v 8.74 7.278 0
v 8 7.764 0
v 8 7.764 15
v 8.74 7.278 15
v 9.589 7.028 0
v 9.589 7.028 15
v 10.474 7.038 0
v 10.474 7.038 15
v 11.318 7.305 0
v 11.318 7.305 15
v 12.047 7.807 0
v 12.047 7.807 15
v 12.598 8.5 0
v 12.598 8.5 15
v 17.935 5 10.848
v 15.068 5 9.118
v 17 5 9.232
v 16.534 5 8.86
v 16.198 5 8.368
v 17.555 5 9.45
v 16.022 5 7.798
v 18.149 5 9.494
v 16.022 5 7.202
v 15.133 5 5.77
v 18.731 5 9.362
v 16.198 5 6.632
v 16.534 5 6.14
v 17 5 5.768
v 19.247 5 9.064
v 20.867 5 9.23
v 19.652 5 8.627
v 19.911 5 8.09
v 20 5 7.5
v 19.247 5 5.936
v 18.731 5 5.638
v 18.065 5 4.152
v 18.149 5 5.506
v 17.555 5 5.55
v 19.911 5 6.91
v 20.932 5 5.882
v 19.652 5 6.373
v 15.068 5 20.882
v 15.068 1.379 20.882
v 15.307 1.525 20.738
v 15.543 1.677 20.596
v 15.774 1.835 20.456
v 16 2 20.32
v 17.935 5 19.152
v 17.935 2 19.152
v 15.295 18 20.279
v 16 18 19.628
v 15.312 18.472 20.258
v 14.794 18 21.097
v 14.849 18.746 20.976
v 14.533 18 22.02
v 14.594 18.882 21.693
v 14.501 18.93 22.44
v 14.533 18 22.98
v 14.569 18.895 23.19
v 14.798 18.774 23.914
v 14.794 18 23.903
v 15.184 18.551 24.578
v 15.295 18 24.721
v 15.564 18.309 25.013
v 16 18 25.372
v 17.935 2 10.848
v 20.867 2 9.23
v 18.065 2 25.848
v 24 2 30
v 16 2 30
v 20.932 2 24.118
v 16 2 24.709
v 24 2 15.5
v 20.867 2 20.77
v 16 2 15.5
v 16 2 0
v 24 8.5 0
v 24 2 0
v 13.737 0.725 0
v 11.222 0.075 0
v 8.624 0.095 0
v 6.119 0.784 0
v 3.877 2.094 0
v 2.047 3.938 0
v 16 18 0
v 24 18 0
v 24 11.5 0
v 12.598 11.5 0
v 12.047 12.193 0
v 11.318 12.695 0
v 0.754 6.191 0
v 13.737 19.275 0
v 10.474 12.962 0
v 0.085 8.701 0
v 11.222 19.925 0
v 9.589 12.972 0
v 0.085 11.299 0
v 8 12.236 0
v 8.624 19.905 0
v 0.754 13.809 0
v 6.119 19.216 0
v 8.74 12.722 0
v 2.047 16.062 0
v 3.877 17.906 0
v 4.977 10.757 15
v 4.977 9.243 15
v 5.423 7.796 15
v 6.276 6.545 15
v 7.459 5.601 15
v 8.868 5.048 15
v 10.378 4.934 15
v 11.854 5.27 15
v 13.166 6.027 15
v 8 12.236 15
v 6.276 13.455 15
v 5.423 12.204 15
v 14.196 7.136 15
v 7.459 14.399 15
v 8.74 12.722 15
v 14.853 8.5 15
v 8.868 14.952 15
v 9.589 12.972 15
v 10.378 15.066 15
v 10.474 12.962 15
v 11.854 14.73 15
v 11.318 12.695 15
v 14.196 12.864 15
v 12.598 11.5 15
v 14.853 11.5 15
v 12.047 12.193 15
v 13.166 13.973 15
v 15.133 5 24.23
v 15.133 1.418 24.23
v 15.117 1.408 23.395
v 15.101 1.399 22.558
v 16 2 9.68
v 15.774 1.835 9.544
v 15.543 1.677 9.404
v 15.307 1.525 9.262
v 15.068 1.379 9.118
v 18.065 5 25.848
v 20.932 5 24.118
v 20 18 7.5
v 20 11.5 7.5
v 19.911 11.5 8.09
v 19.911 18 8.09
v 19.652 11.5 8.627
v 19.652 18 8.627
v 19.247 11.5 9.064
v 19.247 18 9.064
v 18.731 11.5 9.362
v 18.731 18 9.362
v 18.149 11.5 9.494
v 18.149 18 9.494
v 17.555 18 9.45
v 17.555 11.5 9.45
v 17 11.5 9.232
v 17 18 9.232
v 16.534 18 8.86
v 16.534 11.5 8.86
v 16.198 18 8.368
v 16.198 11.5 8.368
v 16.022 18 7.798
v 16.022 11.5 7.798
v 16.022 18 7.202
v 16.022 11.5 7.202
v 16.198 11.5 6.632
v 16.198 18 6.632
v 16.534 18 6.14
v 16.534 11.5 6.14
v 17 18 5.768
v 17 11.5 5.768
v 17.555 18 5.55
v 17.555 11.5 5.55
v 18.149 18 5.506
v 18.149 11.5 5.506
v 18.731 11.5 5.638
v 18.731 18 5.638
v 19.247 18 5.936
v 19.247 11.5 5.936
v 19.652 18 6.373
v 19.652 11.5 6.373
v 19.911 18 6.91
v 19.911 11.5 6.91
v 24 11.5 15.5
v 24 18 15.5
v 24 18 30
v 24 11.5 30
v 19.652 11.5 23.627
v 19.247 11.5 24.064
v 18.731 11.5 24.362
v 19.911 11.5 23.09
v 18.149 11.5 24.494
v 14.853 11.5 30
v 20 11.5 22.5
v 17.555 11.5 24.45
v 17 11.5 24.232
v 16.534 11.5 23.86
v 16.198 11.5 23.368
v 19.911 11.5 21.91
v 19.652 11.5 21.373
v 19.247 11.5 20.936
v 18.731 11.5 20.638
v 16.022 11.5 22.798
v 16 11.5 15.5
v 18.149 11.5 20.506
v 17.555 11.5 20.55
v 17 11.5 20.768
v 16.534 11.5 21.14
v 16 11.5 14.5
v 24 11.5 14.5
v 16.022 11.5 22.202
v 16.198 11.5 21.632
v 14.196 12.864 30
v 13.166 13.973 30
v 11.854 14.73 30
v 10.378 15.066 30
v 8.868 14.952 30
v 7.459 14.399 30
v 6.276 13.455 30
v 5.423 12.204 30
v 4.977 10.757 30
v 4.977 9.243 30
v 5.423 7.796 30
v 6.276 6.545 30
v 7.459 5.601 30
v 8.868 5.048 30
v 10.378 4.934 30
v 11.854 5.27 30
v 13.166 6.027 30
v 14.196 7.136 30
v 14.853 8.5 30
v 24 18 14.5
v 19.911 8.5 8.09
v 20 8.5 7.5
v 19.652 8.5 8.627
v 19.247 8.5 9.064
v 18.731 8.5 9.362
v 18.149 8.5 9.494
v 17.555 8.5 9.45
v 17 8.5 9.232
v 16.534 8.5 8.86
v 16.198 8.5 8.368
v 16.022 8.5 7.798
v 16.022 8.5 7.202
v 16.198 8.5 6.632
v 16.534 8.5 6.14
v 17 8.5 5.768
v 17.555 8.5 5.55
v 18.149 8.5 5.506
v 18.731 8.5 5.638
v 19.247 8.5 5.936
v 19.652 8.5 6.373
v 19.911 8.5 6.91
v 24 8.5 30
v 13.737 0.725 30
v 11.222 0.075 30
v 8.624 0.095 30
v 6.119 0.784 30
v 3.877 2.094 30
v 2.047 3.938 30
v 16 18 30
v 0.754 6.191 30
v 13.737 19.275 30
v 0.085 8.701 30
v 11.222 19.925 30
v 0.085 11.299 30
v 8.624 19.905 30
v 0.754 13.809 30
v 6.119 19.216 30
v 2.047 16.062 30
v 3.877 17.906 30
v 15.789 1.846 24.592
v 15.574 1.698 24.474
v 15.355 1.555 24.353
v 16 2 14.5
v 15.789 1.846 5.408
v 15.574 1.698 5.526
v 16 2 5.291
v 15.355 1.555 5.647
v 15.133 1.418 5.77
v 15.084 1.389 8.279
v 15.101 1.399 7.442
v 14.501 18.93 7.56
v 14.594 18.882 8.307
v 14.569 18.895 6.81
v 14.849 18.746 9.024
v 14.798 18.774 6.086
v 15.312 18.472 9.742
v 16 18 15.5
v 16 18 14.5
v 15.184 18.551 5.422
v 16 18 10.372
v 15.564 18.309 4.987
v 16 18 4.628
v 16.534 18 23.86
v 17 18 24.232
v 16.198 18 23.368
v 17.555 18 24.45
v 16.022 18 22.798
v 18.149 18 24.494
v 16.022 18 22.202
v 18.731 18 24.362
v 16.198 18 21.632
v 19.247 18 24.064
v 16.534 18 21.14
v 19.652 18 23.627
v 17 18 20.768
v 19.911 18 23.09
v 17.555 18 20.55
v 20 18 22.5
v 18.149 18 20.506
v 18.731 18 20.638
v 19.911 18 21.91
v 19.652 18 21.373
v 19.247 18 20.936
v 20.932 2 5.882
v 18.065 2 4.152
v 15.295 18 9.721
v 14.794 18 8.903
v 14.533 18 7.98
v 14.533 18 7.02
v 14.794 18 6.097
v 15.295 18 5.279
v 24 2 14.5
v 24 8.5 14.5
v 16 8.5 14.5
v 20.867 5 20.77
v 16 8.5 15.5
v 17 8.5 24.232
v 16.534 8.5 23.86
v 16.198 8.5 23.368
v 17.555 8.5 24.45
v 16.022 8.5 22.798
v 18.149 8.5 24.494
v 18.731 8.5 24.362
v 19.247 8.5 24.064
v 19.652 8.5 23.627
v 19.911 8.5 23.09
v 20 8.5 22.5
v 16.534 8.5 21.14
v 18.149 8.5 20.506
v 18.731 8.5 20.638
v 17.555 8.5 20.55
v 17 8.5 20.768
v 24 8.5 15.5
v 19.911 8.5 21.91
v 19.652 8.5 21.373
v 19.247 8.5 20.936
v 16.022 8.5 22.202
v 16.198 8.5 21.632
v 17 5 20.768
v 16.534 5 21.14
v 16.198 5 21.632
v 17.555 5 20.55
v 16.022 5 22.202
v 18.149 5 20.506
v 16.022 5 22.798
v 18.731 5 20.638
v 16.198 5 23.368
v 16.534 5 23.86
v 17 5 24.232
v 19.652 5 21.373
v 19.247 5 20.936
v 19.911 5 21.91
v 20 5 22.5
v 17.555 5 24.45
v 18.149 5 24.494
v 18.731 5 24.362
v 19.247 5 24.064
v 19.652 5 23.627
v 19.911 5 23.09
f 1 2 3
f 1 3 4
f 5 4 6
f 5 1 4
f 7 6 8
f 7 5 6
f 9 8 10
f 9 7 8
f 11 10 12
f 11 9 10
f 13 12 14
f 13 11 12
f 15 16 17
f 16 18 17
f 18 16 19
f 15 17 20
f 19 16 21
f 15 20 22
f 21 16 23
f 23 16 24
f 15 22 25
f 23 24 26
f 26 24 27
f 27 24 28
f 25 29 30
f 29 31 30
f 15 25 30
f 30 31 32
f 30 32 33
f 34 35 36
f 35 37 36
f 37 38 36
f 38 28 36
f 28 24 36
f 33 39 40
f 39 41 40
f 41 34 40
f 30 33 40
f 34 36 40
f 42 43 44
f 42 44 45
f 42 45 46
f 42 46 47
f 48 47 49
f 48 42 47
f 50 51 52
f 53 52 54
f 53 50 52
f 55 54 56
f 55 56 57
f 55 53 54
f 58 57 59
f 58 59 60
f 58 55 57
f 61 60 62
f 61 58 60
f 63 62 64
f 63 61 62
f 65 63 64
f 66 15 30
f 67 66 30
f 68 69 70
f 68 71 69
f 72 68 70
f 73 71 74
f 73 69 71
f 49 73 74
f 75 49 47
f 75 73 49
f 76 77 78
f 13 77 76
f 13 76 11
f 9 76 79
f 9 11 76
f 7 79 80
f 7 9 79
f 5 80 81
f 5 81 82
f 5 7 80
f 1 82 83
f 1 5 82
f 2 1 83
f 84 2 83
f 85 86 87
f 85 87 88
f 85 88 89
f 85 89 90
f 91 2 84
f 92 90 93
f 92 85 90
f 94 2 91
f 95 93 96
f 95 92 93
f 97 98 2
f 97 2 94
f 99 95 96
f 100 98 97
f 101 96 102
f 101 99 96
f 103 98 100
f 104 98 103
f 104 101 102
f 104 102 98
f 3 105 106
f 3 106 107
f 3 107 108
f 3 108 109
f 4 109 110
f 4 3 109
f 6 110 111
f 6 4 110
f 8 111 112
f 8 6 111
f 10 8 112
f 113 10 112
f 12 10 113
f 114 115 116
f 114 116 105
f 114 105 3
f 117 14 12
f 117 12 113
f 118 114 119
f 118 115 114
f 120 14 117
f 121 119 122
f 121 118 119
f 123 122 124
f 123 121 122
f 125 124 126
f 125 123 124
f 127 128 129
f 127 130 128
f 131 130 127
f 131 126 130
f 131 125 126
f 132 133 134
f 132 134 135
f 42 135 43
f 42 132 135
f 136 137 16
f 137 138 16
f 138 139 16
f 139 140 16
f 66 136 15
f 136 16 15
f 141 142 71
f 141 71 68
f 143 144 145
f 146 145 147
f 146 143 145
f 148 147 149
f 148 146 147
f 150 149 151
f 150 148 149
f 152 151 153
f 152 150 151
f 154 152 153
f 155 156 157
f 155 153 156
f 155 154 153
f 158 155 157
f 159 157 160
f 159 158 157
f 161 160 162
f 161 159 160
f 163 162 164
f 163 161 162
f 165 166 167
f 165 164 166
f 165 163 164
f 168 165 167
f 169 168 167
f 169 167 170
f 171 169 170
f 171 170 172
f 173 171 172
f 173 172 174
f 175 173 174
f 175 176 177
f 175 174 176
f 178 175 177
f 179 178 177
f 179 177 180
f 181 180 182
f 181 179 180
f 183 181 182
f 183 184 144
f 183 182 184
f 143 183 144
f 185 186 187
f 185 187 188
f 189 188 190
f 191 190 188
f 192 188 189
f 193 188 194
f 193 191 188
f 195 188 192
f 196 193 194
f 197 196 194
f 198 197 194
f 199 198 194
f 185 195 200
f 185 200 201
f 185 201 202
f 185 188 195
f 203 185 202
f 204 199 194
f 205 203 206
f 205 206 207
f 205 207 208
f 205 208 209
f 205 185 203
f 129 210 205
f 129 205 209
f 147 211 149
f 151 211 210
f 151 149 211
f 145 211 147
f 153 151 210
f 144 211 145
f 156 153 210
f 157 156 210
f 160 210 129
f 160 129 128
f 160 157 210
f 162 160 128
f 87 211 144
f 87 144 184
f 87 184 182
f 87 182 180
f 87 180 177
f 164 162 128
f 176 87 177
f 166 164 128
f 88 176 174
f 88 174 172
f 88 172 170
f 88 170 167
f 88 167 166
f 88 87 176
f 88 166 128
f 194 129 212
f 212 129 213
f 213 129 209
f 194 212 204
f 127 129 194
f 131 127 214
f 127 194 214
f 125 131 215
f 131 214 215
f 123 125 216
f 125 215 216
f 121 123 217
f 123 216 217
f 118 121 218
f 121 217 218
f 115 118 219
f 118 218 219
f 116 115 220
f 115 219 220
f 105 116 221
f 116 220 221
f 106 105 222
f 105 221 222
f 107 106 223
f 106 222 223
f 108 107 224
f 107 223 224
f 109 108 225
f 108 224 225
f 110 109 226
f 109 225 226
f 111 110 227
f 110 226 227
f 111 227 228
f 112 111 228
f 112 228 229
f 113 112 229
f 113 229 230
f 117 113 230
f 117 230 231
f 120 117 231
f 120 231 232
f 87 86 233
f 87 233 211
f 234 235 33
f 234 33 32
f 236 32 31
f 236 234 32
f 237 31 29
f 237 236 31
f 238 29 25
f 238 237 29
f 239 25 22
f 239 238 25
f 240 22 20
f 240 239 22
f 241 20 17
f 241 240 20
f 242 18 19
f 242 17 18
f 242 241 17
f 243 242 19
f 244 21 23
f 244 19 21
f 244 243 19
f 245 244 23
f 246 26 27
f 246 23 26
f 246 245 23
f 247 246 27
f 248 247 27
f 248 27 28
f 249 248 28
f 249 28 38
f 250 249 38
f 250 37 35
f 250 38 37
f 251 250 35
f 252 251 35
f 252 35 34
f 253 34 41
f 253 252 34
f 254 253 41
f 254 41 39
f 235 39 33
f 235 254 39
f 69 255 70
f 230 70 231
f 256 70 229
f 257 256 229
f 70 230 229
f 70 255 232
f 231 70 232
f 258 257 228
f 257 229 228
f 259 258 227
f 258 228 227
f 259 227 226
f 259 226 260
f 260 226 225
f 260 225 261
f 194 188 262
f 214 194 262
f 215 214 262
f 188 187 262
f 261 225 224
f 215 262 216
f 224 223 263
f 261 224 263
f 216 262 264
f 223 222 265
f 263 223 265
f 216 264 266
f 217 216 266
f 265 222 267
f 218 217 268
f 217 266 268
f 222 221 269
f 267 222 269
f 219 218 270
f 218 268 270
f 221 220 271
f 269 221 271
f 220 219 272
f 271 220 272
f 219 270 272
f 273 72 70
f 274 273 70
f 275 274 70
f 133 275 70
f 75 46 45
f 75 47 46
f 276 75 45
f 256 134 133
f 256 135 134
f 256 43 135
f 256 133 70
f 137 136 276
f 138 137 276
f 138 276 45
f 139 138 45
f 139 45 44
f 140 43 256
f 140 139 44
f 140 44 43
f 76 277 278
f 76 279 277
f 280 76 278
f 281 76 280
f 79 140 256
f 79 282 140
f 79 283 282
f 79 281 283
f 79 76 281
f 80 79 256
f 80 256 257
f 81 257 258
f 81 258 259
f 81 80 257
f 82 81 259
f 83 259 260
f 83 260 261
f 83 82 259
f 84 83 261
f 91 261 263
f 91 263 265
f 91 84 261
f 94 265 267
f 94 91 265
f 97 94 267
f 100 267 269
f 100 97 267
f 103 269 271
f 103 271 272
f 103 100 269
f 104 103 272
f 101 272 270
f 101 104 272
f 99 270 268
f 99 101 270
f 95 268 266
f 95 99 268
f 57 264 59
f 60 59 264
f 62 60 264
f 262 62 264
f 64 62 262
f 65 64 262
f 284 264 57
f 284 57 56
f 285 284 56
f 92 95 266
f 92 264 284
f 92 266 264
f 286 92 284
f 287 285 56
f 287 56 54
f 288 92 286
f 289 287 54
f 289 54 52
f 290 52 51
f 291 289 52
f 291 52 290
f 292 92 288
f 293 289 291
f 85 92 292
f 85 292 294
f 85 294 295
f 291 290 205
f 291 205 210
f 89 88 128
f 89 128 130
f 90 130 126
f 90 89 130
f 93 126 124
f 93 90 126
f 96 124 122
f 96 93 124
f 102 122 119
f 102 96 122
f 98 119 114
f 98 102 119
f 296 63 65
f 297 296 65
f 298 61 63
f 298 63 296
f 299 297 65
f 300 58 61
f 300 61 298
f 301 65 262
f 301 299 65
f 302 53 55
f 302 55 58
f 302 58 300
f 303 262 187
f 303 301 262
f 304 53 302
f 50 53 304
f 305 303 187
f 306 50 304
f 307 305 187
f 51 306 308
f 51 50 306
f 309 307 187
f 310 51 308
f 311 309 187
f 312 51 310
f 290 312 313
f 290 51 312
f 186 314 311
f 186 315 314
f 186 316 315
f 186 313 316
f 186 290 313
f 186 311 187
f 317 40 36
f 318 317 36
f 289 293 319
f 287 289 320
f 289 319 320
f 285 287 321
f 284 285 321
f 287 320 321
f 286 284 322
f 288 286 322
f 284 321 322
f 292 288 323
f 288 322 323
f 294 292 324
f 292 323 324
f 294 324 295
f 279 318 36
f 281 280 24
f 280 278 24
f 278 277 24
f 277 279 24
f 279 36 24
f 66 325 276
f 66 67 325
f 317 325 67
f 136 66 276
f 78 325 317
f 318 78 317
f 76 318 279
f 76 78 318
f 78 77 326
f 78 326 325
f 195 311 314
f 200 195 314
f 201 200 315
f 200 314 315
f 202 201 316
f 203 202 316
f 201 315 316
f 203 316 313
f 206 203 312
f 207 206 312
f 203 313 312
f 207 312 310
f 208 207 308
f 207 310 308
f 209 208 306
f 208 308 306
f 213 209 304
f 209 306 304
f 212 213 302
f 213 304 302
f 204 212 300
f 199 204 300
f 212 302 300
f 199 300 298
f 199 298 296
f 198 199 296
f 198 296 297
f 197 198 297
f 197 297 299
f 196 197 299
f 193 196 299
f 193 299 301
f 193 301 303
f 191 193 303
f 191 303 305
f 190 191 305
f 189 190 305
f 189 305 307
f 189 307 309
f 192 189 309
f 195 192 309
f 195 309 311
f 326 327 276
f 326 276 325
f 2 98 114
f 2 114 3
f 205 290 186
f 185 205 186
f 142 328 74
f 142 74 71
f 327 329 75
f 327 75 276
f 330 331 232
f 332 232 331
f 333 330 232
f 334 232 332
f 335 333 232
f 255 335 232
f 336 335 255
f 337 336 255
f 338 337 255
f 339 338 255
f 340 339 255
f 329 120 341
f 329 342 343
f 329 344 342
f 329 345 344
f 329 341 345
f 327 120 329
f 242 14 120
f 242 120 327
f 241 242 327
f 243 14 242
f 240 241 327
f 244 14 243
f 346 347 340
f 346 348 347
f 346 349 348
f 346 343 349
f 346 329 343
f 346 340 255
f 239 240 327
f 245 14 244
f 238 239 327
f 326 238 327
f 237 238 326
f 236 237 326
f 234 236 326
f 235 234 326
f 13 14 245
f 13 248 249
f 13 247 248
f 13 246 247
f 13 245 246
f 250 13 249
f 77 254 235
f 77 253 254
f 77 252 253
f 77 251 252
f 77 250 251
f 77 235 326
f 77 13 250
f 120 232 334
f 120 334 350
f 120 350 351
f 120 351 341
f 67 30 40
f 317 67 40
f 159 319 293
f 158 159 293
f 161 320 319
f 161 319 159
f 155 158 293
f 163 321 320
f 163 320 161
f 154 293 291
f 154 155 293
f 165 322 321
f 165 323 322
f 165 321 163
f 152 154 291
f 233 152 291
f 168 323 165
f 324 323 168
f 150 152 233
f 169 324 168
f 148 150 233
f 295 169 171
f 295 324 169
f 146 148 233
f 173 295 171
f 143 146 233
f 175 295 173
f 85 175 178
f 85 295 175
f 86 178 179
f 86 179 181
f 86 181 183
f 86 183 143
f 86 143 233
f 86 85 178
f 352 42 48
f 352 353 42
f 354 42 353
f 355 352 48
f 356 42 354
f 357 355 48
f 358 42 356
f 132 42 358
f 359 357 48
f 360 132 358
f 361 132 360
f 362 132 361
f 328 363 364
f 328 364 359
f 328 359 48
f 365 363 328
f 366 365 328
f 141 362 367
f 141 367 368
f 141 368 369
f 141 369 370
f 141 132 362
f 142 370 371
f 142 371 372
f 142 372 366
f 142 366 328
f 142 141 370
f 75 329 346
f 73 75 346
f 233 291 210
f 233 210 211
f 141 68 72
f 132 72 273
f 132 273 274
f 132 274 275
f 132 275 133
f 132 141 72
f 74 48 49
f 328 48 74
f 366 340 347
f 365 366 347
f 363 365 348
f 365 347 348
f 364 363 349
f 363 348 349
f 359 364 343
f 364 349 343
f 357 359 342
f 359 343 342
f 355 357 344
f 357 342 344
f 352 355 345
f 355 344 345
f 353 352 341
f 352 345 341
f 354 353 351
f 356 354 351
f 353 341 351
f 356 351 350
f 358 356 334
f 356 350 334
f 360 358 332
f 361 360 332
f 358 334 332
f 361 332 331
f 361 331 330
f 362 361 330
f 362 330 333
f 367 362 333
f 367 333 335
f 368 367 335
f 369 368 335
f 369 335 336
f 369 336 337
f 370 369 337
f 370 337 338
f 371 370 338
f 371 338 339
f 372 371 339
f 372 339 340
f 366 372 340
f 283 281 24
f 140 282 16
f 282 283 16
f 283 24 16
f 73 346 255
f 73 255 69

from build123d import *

# Parameters (mm, degrees)
BOSS_EXTRUDE1_DEPTH     = 30
SKETCH3_R               = 2
CUT_EXTRUDE2_DEPTH      = 19.00000001
SKETCH8_R               = 3.5
CUT_EXTRUDE5_DEPTH      = 10
SKETCH9_W               = 8.000001136
SKETCH9_H               = 1
CUT_EXTRUDE6_DEPTH      = 2.999999513
CUT_EXTRUDE6_DEPTH_BACK = 19.00000011
CUT_EXTRUDE7_START      = -3
CUT_EXTRUDE7_DEPTH      = 5.999999514
SKETCH12_R              = 5.08
CUT_EXTRUDE8_DEPTH      = 15


with BuildPart() as part:
    # Sketch1 → Boss-Extrude1 (new body)
    with BuildSketch(Plane.XY):
        with BuildLine():
            Line((7.999999523, 12.236067772), (7.999999523, 7.763931751))
            ThreePointArc((7.999999523, 7.763931751), (10.474207269, 7.037715521), (12.598076062, 8.499999806))
            Line((12.598076062, 8.499999806), (23.999999754, 8.499999806))
            Line((23.999999754, 8.499999806), (23.999999754, 1.999999464))
            Line((23.999999754, 1.999999464), (15.9999988, 1.999999464))
            ThreePointArc((15.9999988, 1.999999464), (-3.4e-08, 9.99999976), (15.999998799, 18.00000006))
            Line((15.999998799, 18.00000006), (23.999999935, 18.00000006))
            Line((23.999999935, 18.00000006), (23.999999935, 11.500000167))
            Line((23.999999935, 11.500000167), (12.598075802, 11.500000167))
            ThreePointArc((12.598075802, 11.500000167), (10.474207012, 12.962284044), (7.999999523, 12.236067772))
        make_face()
    extrude(amount=BOSS_EXTRUDE1_DEPTH)

    # Sketch3 → Cut-Extrude2 (cut, through all)
    with BuildSketch(Plane(origin=(0, 18.00000006, 0), x_dir=(1, 0, 0), z_dir=(0, 1, 0))):
        with Locations((17.999999935, -22.5)):
            Circle(SKETCH3_R)
    cut_extrude2 = extrude(amount=-CUT_EXTRUDE2_DEPTH, mode=Mode.SUBTRACT)

    # Sketch8 → Cut-Extrude5 (cut)
    with BuildSketch(Plane(origin=(0, 18.00000006, 0), x_dir=(1, 0, 0), z_dir=(0, 1, 0))):
        with Locations((17.999999935, -22.5)):
            Circle(SKETCH8_R)
    cut_extrude5 = extrude(amount=CUT_EXTRUDE5_DEPTH, mode=Mode.SUBTRACT)

    # Sketch9 → Cut-Extrude6 (cut, two sides)
    with BuildSketch(Plane(origin=(0, 18.00000006, 0), x_dir=(1, 0, 0), z_dir=(0, 1, 0))) as cut_extrude6_sk:
        with Locations((19.999999367, -15)):
            Rectangle(SKETCH9_W, SKETCH9_H)
    extrude(amount=CUT_EXTRUDE6_DEPTH, mode=Mode.SUBTRACT)
    extrude(cut_extrude6_sk.sketch, amount=-CUT_EXTRUDE6_DEPTH_BACK, mode=Mode.SUBTRACT)

    # Sketch10 → Cut-Extrude7 (cut)
    with BuildSketch(Plane.XZ.offset(-1.999999464).offset(CUT_EXTRUDE7_START)):
        Polygon((15.067996564, 20.882381514), (17.934896952, 19.152001354), (20.866900323, 20.76961984), (20.932003306, 24.117618486), (18.065102919, 25.847998646), (15.133099548, 24.23038016), align=None)
    cut_extrude7 = extrude(amount=CUT_EXTRUDE7_DEPTH, mode=Mode.SUBTRACT)

    # Mirror1: Cut-Extrude7 across plane
    add(cut_extrude7.mirror(Plane.XY.offset(15)), mode=Mode.SUBTRACT)

    # Mirror2: Cut-Extrude2, Cut-Extrude5 across plane
    add(cut_extrude2.mirror(Plane.XY.offset(15)), mode=Mode.SUBTRACT)
    add(cut_extrude5.mirror(Plane.XY.offset(15)), mode=Mode.SUBTRACT)

    # Sketch12 → Cut-Extrude8 (cut)
    with BuildSketch(Plane.XY.offset(30)):
        with Locations((9.999999677, 9.999999762)):
            Circle(SKETCH12_R)
    extrude(amount=-CUT_EXTRUDE8_DEPTH, mode=Mode.SUBTRACT)


solid = part.part
